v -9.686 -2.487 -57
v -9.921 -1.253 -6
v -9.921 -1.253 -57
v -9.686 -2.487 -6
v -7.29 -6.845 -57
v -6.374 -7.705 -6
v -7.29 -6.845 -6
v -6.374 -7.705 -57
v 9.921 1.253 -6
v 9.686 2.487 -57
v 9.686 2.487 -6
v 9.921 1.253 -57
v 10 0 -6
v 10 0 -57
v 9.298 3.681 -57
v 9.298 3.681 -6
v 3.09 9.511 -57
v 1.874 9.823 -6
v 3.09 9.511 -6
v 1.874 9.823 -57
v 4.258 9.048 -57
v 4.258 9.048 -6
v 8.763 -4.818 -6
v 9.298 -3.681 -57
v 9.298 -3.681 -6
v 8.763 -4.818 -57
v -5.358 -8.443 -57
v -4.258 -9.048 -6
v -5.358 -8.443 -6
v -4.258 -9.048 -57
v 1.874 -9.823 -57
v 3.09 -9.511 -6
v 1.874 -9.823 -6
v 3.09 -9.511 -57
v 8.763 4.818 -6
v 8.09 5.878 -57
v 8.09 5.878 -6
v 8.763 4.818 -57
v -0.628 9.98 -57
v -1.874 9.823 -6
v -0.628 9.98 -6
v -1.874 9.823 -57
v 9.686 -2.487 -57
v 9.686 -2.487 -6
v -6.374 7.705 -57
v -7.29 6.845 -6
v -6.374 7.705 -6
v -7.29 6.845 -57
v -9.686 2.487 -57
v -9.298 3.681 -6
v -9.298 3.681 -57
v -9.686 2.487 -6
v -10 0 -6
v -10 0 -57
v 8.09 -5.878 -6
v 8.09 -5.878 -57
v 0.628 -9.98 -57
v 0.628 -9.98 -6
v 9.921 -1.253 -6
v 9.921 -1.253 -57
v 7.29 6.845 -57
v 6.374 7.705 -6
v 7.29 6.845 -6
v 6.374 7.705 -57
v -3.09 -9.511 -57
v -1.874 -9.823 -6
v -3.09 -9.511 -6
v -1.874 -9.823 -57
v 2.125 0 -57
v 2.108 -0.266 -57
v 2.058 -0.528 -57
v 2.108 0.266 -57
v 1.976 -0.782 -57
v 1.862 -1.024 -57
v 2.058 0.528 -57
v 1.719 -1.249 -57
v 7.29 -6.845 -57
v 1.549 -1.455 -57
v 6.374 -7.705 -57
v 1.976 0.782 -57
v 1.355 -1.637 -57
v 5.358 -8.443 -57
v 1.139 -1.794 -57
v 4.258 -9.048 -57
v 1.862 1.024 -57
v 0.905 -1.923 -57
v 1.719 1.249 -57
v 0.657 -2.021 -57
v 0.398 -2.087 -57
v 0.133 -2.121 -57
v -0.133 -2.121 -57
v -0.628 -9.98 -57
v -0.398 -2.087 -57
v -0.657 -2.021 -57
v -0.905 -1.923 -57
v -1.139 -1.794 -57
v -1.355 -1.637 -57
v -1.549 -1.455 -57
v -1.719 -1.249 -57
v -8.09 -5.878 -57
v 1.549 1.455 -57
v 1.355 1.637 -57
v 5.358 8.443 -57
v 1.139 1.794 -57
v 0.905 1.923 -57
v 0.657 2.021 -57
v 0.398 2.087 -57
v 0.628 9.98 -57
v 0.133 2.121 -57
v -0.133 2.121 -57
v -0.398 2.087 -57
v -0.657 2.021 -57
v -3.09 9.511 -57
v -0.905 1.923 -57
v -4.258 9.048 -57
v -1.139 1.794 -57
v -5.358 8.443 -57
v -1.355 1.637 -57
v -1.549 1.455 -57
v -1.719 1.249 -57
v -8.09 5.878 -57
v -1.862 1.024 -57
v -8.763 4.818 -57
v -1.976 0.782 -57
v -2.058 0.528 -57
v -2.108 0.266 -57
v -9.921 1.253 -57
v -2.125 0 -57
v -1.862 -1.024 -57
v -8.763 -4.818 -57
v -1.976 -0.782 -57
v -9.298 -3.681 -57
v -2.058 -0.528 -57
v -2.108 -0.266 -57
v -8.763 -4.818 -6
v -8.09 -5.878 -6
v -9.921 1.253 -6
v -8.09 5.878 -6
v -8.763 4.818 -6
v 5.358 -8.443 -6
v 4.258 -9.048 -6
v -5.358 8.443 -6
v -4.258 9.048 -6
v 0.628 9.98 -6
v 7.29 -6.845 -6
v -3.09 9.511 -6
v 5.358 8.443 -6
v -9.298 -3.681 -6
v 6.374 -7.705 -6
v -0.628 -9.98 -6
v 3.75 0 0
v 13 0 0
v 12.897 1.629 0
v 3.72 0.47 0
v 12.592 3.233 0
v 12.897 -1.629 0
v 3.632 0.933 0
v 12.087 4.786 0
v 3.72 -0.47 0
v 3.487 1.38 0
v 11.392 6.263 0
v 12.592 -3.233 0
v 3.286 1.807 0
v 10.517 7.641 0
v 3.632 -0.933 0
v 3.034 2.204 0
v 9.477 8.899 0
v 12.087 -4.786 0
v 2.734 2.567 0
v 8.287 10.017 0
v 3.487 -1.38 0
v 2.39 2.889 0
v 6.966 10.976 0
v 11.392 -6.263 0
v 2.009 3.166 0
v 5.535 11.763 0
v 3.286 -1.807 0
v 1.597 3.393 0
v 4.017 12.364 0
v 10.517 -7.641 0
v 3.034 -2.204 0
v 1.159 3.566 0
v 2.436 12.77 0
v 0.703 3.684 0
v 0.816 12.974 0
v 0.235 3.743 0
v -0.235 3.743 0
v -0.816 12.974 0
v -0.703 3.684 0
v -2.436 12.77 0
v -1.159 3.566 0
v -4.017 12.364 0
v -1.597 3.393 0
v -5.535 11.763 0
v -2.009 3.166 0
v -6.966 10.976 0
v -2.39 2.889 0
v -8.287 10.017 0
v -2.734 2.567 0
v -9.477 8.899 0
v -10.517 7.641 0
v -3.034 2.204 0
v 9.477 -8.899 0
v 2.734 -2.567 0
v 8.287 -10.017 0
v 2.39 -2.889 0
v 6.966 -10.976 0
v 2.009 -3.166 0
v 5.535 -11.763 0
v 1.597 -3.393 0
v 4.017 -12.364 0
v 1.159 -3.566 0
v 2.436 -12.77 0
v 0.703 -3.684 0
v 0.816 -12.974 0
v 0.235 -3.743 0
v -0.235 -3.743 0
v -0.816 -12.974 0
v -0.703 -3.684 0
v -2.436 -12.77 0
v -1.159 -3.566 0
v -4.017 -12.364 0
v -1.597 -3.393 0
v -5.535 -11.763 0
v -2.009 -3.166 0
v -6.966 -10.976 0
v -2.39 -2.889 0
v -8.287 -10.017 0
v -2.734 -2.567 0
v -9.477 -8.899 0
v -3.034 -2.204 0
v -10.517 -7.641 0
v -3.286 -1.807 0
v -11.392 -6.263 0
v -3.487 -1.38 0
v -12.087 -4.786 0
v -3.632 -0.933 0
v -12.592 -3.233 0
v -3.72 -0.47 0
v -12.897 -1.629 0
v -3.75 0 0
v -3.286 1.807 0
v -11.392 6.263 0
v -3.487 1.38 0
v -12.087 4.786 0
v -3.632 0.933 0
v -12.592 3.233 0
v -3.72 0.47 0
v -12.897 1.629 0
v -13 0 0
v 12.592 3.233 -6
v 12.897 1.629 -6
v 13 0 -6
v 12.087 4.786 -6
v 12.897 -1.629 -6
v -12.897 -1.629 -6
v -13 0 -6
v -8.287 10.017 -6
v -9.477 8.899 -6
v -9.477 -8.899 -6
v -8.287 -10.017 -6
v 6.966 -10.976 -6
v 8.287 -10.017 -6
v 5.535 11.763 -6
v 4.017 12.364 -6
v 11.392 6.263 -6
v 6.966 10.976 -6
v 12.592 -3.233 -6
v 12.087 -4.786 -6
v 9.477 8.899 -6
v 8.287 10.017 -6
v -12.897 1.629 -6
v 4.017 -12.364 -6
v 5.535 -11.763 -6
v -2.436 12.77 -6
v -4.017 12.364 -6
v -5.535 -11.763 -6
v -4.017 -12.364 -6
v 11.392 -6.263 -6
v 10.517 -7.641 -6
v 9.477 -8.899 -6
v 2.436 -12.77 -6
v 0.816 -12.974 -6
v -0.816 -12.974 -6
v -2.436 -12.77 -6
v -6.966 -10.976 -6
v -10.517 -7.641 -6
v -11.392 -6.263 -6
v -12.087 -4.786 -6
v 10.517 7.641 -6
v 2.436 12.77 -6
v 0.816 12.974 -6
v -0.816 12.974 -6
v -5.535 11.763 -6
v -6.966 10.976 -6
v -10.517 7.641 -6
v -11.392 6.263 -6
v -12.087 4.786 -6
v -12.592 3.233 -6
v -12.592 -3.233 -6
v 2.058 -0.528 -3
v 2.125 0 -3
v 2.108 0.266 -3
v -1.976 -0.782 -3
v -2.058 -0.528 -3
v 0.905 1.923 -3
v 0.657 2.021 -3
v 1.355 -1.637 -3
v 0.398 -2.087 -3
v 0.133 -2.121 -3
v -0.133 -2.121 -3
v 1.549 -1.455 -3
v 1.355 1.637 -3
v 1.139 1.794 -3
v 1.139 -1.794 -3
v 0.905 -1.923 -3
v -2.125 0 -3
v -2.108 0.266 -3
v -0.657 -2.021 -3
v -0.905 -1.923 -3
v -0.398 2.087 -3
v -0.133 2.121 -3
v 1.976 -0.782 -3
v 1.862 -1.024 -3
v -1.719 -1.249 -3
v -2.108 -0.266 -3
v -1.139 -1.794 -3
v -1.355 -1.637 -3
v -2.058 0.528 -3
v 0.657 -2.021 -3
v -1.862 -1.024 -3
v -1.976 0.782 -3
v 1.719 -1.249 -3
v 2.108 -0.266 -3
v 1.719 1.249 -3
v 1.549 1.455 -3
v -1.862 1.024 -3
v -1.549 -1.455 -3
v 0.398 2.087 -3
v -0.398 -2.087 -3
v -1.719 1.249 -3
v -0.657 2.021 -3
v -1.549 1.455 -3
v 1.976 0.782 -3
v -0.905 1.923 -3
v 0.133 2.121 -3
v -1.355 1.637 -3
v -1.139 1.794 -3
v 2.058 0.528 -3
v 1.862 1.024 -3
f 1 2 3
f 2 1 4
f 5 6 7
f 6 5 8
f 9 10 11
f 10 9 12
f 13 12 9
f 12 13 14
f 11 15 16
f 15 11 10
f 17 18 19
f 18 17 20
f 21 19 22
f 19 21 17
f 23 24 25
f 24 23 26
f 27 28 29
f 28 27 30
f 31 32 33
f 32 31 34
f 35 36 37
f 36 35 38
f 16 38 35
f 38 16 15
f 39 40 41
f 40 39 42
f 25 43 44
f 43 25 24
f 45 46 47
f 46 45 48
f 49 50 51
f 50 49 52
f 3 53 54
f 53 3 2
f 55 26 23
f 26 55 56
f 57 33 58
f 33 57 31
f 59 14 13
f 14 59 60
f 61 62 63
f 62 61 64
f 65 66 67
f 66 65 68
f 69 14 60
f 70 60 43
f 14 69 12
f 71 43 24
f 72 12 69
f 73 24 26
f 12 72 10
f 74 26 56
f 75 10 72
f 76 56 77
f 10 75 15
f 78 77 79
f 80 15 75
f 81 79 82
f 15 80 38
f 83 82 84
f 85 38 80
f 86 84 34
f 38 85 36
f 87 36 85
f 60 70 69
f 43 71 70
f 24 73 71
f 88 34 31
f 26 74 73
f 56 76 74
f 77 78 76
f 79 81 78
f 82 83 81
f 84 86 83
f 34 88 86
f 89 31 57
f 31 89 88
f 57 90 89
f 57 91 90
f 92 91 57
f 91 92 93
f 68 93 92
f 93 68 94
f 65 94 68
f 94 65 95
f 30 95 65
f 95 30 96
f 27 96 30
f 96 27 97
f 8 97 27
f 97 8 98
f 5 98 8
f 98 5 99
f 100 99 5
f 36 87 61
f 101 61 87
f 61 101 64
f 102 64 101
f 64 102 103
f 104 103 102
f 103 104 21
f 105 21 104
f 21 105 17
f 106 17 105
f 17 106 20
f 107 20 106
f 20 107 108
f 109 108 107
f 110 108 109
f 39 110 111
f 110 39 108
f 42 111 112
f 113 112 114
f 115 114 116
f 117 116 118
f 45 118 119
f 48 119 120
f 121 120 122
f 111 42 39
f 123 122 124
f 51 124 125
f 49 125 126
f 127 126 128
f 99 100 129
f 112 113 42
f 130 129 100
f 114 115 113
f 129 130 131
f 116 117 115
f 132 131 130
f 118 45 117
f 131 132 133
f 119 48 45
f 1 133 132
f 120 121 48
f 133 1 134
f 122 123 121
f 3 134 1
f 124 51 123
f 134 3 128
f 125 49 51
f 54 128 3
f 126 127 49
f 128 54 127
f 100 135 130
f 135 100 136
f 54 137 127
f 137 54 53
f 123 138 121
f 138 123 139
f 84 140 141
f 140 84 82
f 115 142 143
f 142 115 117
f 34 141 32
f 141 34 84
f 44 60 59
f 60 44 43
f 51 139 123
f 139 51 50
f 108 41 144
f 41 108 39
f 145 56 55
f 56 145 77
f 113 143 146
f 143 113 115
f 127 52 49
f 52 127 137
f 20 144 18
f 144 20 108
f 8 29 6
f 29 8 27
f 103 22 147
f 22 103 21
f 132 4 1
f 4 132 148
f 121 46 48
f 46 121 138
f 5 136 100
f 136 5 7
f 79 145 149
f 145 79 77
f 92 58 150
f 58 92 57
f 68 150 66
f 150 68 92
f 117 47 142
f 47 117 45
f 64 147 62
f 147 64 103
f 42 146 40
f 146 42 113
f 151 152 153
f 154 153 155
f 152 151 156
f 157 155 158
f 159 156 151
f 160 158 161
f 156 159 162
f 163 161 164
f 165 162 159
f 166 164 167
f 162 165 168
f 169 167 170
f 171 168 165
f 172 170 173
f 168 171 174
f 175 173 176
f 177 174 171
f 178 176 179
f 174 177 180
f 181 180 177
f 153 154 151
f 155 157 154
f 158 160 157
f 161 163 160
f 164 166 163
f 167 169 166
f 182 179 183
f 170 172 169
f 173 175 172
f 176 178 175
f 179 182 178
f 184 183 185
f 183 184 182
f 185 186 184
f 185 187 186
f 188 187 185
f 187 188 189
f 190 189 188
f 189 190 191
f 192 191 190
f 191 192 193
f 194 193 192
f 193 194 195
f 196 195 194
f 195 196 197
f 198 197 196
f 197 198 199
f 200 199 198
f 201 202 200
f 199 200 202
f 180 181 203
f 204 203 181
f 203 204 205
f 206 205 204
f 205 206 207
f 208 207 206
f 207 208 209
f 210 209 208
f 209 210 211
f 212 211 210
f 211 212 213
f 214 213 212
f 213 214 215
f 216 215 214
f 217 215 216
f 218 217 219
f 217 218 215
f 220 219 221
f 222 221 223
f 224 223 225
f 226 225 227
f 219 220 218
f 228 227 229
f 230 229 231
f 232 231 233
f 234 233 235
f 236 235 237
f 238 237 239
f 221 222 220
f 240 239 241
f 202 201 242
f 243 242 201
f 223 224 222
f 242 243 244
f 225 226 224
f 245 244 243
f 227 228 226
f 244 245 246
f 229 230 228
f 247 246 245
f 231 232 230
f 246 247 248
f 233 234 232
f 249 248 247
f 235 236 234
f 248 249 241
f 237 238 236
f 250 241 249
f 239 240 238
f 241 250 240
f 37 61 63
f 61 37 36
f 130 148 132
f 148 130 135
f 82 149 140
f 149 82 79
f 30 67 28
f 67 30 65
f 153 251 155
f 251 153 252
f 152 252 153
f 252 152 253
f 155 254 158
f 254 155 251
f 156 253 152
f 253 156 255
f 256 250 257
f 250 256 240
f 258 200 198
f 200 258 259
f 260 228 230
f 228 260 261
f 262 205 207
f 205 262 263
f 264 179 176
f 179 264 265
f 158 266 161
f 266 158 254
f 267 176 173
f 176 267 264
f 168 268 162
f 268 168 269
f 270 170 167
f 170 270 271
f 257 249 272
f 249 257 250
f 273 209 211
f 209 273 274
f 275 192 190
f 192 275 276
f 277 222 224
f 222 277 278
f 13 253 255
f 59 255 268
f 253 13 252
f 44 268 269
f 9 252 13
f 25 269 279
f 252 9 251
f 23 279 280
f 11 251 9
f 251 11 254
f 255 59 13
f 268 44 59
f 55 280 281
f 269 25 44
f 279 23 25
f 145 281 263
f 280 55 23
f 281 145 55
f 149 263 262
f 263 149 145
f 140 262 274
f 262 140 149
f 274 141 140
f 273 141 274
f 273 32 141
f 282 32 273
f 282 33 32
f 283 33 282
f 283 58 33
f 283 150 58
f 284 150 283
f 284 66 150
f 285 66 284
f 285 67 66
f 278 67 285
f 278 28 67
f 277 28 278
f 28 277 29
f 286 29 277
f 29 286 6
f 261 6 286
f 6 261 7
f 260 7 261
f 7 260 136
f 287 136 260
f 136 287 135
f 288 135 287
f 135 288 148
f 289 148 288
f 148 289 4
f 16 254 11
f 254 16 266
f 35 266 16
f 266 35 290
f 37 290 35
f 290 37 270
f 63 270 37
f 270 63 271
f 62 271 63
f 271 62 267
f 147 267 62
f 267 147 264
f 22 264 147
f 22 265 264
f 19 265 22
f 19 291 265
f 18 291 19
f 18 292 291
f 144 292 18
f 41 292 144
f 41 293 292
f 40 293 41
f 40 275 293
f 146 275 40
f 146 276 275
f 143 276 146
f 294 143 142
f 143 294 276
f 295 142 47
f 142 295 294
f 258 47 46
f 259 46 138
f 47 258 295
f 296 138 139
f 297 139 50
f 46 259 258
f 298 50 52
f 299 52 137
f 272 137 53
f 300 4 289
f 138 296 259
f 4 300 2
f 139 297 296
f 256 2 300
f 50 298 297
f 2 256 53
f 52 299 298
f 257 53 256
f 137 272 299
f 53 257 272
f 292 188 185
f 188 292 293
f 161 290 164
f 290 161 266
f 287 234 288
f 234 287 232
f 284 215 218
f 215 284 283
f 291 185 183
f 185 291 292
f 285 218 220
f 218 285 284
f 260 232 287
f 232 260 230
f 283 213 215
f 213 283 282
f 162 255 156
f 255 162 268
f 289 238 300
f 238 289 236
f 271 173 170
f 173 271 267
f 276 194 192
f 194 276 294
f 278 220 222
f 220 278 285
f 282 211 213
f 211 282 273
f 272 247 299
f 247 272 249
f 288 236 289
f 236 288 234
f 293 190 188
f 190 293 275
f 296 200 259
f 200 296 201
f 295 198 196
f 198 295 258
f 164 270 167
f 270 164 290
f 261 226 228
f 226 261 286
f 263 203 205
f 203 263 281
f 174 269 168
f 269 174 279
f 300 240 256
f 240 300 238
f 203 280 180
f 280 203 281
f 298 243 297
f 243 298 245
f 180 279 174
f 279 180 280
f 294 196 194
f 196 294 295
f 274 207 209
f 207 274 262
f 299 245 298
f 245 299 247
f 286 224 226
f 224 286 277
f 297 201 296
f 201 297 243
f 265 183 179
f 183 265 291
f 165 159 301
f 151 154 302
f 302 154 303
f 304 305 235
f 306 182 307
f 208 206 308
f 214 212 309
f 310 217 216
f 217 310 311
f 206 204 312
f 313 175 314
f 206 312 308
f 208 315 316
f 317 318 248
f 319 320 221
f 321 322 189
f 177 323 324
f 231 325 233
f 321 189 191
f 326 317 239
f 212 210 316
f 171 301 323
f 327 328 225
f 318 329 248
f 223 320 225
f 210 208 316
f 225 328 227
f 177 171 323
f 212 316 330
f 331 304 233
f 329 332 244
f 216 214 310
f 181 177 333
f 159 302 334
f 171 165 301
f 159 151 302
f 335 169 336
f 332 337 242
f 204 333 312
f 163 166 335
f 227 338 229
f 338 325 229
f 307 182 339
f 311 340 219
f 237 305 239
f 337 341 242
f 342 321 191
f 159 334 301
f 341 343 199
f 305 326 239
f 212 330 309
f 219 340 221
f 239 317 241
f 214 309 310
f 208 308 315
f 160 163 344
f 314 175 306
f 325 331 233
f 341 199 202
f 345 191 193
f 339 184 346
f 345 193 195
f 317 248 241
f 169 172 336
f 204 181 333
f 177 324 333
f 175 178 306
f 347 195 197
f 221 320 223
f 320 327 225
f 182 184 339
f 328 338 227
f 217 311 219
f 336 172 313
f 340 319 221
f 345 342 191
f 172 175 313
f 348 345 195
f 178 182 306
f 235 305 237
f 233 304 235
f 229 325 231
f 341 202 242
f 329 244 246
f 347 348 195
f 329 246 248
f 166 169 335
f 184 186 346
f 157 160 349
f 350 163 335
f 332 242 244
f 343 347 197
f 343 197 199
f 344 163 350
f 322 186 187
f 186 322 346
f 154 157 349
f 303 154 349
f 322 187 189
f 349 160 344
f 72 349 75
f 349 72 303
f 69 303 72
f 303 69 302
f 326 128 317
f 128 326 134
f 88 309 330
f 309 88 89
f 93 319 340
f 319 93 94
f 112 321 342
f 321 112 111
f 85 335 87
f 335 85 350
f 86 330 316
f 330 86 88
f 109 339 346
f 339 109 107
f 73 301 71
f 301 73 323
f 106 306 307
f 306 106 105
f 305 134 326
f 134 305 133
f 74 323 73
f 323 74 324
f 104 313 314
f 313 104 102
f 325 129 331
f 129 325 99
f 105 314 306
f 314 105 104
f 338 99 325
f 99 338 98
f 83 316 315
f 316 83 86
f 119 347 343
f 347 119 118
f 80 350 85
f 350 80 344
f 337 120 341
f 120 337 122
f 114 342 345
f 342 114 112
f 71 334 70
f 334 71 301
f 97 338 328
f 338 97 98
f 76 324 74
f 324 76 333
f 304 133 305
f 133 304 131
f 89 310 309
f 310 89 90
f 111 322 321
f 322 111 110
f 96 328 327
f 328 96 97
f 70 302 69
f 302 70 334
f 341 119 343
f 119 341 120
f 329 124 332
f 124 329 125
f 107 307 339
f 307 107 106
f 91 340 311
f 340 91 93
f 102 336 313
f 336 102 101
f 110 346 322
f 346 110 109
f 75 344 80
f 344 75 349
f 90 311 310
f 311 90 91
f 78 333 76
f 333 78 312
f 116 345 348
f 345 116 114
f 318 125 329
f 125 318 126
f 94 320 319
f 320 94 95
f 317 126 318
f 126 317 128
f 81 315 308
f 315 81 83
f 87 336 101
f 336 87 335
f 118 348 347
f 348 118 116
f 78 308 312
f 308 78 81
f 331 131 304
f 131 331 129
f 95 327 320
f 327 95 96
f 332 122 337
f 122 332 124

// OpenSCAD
$fn = 50;


difference() {
	union() {
		translate(v = [0, 0, -57.0000000000]) {
			cylinder(h = 57, r = 10.0000000000);
		}
		translate(v = [0, 0, -6.0000000000]) {
			cylinder(h = 6, r = 13.0000000000);
		}
	}
	union() {
		translate(v = [0, 0, 0]) {
			rotate(a = [0, 0, 0]) {
				difference() {
					union() {
						#translate(v = [0, 0, -57.0000000000]) {
							cylinder(h = 57, r = 2.0000000000);
						}
						#translate(v = [0, 0, -3]) {
							cylinder(h = 3, r1 = 2.1250000000, r2 = 3.7500000000);
						}
						#translate(v = [0, 0, -57.0000000000]) {
							cylinder(h = 57, r = 2.1250000000);
						}
						#translate(v = [0, 0, -57.0000000000]) {
							cylinder(h = 57, r = 2.0000000000);
						}
					}
					union();
				}
			}
		}
	}
}
